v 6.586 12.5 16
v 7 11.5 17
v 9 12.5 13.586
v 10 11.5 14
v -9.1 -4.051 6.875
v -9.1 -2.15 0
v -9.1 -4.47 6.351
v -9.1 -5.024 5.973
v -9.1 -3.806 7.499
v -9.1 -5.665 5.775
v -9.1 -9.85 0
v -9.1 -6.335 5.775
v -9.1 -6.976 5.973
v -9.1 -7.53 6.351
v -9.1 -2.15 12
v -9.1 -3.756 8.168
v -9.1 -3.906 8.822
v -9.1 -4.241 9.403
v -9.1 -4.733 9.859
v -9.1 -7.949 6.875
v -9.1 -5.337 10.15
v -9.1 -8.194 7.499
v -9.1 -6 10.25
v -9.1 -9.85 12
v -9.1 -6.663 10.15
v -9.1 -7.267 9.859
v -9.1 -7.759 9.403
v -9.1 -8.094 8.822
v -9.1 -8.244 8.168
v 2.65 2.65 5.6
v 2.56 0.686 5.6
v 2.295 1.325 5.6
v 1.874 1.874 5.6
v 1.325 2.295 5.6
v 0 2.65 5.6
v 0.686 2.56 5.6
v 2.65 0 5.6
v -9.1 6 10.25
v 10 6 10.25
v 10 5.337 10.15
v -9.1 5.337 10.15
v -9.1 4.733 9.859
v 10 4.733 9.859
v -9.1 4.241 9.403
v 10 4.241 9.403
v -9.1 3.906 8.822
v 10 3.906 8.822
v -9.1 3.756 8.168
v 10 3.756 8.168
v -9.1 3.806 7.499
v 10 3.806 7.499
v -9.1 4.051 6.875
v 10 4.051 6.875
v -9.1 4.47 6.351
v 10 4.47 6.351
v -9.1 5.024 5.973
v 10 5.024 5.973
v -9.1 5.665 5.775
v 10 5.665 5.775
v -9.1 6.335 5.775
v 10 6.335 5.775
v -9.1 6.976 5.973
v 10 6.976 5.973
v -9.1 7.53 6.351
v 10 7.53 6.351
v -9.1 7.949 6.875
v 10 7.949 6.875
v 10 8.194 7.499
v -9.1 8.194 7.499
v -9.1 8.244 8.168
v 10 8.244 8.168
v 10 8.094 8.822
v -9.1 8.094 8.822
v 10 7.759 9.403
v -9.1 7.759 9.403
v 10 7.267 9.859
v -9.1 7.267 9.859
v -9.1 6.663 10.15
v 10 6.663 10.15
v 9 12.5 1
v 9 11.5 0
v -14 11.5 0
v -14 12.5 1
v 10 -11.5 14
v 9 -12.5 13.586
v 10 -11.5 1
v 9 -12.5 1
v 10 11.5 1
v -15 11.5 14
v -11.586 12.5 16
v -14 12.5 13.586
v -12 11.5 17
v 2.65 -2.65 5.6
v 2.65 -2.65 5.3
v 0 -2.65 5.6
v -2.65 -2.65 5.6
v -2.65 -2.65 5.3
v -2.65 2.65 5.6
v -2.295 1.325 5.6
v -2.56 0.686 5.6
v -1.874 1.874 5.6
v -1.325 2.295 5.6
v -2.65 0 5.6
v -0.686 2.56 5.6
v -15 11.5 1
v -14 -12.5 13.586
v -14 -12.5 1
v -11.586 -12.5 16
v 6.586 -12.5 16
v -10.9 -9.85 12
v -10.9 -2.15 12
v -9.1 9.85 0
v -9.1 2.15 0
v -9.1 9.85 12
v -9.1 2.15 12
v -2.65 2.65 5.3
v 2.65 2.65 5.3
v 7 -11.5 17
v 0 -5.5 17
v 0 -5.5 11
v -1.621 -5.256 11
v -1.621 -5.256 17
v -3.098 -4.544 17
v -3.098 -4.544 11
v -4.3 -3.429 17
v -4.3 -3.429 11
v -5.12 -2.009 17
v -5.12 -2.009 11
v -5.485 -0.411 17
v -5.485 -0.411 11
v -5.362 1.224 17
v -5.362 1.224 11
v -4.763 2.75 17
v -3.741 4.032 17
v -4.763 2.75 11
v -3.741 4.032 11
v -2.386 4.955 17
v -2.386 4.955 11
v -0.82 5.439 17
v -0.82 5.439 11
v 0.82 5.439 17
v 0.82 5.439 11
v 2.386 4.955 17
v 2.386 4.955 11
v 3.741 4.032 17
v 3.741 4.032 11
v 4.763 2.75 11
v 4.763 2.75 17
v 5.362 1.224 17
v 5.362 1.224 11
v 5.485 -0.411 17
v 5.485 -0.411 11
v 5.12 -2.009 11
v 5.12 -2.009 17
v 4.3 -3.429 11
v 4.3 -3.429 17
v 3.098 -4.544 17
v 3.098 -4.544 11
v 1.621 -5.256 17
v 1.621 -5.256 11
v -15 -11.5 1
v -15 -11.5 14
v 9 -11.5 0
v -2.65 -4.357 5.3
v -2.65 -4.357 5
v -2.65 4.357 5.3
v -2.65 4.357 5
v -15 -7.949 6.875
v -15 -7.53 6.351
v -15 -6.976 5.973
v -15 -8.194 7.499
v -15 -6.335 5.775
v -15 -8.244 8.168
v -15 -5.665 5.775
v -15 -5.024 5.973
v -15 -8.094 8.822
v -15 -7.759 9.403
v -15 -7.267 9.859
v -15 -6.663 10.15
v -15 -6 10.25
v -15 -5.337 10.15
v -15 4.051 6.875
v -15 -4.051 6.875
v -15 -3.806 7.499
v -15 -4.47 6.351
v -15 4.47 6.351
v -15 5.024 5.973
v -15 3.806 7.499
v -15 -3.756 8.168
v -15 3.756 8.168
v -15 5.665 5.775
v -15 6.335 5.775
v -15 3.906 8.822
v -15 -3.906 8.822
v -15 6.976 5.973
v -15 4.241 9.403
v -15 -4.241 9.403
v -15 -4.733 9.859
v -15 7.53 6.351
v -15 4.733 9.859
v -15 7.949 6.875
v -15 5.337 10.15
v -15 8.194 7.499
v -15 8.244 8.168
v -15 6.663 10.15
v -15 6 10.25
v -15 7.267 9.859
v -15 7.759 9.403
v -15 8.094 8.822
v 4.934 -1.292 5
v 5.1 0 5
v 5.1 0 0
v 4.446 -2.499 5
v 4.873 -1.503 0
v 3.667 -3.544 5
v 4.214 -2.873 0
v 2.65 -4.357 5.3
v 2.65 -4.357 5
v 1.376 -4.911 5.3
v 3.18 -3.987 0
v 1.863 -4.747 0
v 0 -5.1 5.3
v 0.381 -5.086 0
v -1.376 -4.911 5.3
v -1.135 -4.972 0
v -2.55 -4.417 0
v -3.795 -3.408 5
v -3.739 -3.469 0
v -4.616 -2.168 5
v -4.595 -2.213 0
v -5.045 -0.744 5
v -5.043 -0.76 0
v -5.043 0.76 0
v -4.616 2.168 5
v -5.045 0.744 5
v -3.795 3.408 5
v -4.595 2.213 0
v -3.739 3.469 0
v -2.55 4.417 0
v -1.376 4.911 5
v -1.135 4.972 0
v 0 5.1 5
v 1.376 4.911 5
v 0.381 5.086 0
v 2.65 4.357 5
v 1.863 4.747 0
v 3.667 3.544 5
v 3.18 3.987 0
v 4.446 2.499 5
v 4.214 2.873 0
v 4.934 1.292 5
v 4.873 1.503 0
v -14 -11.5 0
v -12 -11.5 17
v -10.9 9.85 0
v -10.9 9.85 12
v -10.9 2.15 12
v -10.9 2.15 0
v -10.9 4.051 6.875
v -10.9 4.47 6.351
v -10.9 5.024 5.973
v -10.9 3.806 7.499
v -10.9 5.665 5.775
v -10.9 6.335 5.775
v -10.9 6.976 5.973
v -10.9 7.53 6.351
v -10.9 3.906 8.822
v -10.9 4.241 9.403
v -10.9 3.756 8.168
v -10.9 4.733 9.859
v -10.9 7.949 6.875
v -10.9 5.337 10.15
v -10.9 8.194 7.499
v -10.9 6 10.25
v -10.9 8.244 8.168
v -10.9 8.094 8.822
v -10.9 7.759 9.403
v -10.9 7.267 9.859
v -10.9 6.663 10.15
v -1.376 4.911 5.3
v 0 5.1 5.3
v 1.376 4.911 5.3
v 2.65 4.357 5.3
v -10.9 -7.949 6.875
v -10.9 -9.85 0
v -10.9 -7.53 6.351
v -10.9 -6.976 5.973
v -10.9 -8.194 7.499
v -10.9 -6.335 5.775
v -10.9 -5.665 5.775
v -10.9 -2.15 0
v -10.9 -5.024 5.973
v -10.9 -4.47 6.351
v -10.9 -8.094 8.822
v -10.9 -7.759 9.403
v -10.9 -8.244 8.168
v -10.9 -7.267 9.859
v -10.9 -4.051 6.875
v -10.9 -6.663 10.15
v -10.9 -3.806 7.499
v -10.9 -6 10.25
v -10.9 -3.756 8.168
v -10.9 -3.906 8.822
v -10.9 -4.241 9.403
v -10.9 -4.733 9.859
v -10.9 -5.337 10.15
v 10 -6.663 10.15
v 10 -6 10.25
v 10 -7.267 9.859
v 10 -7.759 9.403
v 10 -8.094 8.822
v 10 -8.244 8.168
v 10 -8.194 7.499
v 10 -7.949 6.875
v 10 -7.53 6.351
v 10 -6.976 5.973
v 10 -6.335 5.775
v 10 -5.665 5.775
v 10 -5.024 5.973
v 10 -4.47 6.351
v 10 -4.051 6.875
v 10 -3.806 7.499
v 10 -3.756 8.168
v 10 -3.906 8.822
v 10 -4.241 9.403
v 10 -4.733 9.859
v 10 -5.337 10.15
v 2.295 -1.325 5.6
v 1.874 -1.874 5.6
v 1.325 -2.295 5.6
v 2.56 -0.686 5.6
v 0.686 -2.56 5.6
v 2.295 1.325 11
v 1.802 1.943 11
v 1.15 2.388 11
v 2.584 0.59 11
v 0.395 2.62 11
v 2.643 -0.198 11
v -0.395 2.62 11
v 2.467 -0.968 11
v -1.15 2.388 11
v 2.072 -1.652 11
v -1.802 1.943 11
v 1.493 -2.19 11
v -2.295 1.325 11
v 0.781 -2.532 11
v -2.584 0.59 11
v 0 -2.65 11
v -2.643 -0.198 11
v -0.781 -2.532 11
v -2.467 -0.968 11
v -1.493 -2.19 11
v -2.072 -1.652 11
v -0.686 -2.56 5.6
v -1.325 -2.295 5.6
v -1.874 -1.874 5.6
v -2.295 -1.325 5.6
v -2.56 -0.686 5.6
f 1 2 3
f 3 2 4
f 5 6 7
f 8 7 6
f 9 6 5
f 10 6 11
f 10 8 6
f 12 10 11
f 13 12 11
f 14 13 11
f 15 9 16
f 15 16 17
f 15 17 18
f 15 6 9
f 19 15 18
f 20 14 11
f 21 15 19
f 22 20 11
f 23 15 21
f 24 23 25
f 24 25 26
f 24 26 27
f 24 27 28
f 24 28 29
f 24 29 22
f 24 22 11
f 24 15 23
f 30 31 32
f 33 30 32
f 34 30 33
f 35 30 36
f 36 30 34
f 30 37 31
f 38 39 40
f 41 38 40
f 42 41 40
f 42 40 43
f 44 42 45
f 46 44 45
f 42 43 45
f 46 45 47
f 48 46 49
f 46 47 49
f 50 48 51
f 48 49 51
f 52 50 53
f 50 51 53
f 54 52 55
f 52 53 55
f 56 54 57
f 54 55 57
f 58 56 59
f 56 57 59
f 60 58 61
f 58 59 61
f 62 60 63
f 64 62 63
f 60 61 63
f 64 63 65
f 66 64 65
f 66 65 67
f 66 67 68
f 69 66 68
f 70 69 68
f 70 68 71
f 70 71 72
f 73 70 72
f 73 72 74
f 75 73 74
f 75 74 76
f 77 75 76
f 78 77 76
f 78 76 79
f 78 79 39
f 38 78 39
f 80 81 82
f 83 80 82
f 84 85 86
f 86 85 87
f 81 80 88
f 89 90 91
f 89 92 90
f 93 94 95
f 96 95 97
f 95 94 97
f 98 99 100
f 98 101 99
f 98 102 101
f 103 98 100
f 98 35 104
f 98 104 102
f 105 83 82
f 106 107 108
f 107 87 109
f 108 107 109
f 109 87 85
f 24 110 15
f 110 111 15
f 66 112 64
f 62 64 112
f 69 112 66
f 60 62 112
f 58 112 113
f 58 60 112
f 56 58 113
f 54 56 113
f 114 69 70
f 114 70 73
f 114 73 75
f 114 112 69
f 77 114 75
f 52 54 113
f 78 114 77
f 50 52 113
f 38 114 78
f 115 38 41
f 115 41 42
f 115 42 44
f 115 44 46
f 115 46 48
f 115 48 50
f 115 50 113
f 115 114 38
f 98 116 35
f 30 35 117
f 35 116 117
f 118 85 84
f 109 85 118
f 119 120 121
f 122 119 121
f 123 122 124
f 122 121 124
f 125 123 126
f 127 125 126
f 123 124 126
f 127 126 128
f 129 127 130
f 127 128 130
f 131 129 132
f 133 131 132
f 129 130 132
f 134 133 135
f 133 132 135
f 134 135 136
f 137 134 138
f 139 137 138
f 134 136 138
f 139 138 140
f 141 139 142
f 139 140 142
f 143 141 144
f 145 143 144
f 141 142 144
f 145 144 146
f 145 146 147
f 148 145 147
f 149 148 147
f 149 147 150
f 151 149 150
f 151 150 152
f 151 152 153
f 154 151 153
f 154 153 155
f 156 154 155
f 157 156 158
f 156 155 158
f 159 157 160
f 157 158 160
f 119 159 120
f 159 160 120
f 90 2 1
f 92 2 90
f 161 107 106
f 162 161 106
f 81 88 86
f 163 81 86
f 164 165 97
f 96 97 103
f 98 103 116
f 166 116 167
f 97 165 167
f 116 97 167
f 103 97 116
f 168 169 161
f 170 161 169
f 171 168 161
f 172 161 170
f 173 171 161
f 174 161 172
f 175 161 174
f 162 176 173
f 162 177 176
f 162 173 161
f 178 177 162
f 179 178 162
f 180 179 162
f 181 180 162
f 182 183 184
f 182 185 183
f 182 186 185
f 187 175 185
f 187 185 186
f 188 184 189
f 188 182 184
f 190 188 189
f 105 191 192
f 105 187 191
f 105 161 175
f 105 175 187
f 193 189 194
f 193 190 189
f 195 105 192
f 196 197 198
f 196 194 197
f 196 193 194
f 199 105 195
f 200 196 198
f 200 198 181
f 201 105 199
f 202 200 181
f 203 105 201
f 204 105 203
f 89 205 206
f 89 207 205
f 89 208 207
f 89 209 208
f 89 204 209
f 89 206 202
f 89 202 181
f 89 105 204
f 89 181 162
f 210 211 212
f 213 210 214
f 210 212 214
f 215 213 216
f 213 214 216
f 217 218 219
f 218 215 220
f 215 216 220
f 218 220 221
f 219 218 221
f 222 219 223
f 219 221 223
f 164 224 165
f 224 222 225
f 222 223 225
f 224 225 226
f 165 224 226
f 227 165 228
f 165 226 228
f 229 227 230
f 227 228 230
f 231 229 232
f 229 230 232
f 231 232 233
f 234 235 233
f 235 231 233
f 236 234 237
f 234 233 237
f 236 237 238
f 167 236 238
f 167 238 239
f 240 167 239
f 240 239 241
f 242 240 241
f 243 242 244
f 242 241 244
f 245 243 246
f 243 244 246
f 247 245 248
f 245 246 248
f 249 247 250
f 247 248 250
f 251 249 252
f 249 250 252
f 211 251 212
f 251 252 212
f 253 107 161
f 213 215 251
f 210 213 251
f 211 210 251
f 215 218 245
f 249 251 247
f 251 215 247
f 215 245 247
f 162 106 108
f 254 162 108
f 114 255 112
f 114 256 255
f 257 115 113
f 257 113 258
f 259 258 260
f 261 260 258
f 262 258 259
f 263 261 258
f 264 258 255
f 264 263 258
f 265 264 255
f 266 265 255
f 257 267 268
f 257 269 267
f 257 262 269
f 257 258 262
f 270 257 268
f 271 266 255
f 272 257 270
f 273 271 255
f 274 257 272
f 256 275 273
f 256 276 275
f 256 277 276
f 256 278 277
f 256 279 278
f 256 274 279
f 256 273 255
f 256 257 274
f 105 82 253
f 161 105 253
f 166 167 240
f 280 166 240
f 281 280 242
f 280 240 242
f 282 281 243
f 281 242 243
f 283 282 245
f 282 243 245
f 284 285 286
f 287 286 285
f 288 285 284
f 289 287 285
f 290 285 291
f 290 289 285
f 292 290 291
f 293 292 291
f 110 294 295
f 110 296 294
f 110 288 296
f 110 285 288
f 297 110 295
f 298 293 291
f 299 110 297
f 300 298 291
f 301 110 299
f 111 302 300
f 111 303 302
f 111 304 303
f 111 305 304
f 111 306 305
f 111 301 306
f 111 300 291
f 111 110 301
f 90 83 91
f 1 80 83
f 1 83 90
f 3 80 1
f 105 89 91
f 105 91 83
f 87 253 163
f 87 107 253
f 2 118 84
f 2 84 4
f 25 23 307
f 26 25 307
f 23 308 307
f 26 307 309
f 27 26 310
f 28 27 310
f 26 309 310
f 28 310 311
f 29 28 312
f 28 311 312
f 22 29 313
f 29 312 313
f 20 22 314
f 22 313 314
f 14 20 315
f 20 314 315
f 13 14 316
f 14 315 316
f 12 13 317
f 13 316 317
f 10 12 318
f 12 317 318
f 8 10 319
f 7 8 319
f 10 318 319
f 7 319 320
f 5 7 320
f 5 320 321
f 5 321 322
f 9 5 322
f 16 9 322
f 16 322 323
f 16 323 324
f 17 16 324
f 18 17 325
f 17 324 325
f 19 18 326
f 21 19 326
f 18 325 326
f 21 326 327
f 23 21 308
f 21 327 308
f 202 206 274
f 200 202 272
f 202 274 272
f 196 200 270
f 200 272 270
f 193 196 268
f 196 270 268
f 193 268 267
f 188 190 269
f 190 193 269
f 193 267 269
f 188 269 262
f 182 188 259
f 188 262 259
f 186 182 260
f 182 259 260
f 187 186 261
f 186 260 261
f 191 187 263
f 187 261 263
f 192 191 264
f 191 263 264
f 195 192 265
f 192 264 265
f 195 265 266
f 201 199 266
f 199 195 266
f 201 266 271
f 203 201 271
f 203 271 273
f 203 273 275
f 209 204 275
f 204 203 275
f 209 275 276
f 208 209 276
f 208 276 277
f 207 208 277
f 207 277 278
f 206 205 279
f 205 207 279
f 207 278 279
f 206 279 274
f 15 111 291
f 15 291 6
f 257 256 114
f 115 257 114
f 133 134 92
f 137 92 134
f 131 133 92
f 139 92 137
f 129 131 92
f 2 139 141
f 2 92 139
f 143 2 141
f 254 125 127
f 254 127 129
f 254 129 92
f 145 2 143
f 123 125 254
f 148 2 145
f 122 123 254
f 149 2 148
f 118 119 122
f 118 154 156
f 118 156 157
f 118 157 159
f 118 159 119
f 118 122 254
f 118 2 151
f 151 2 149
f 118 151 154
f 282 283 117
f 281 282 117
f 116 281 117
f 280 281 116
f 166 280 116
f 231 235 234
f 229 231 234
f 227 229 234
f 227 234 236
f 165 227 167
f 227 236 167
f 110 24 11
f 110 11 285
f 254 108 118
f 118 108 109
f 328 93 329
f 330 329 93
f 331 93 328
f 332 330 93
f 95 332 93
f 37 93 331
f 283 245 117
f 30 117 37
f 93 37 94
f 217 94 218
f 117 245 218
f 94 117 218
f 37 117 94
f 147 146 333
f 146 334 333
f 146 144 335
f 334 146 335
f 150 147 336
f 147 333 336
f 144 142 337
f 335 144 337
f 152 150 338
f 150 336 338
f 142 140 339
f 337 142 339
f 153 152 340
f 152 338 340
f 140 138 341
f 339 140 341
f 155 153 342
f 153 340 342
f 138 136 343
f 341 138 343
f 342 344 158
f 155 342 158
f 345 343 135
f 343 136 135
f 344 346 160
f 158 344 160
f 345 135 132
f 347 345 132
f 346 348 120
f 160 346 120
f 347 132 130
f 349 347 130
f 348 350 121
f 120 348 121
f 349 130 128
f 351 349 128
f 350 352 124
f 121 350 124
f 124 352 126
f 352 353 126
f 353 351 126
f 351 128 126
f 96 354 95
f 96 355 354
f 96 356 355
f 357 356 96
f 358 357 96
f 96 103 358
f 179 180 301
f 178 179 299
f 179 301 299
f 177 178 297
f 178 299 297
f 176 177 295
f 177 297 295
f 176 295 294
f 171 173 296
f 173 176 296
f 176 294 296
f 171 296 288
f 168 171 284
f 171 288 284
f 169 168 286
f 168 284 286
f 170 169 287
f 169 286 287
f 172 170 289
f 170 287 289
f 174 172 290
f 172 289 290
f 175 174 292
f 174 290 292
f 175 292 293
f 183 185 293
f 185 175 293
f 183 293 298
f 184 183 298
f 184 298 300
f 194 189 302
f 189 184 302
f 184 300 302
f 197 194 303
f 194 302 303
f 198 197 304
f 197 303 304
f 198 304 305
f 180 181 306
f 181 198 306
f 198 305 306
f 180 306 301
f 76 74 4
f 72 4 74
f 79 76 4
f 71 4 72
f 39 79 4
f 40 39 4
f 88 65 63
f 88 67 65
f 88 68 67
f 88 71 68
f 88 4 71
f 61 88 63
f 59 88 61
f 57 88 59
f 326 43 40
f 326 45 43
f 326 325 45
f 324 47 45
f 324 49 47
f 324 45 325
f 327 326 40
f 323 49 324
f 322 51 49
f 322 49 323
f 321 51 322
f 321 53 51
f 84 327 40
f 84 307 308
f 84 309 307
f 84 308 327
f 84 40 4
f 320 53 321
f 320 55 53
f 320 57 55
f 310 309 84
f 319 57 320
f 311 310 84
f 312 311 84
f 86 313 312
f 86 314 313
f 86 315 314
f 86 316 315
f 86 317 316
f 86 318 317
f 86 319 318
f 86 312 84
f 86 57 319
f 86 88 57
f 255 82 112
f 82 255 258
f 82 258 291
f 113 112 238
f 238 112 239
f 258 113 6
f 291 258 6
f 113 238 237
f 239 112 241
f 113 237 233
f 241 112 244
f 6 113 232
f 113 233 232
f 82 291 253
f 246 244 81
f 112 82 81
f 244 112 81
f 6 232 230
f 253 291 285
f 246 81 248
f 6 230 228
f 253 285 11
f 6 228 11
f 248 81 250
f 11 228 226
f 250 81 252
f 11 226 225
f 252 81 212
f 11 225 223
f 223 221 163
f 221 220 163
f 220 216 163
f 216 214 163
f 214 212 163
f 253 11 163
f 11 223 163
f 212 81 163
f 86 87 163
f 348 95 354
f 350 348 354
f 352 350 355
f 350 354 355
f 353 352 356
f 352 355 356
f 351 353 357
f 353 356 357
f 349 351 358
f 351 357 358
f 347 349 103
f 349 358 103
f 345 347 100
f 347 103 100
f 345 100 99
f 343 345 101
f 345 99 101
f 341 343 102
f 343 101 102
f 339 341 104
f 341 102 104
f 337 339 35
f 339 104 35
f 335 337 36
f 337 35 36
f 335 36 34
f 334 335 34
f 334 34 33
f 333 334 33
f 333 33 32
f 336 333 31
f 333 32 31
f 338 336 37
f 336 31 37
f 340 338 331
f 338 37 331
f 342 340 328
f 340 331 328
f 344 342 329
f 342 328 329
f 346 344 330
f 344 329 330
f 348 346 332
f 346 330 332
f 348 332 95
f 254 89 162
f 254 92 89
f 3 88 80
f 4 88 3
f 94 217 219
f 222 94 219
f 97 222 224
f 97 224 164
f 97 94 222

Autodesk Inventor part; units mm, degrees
ref_plane "YZ Plane" through (0, 0, 0) normal (1, 0, 0) x (0, 1, 0)
ref_plane "XZ Plane" through (0, 0, 0) normal (0, 1, 0) x (-1, 0, 0)
ref_plane "XY Plane" through (0, 0, 0) normal (0, 0, 1) x (1, 0, 0)
sketch "スケッチ1" plane through (0, 0, 0) normal (0, 0, 1) x (1, 0, 0)
  circle A0 centre (0, 0) radius 5.1
  line L0 (10, -12.5) -> (-10, -12.5)
  line L1 (-10, -12.5) -> (-10, 12.5)
  line L2 (-10, 12.5) -> (10, 12.5)
  line L3 (10, 12.5) -> (10, -12.5)
  line L4 (10, -12.5) -> (-10, 12.5) construction
  line L5 (-10, -12.5) -> (10, 12.5) construction
  dimension "d0" = 10.2
  dimension "d1" = 25
  dimension "d2" = 20
extrude "押し出し1" add sketch "スケッチ1" along normal blind 17
sketch "スケッチ2" plane through (0, 0, 17) normal (0, 0, 1) x (1, 0, 0)
  circle A0 centre (0, 0) radius 5.1 projected
extrude "押し出し2" add sketch "スケッチ2" against normal blind 12
sketch "スケッチ3" plane through (0, 0, 17) normal (0, 0, 1) x (1, 0, 0)
  point P0 (0, 0)
hole "穴1" at (0, 0, 17) direction (0, 0, -1) diameter 5.3 depth 58 counterbore diameter 11 counterbore depth 6
sketch "Sketch7" plane through (-10, -12.5, 0) normal (-1, 0, 0) x (0, 0, 1)
  line L0 (0, 25) -> (0, 0) projected
  line L1 (5, 7.4) -> (5, 17.6) projected
  line L2 (0, 17.6) -> (0, 7.4) projected
  point P0 (0, 12.5)
  point P1 (8, 6.5)
  point P2 (8, 18.5)
  dimension "d35" = 8
  dimension "d36" = 12
  dimension "d37" = 6
hole "Hole3" at (-10, -6, 8) at (-10, 6, 8) direction (1, 0, 0) diameter 4.5 depth 58
chamfer "Chamfer2" distance 3 angle 45 1 edges at (10, 0, 17)
sketch "Sketch8" plane through (-10, -12.5, 0) normal (-1, 0, 0) x (0, 0, 1)
  circle A0 centre (8, 6.5) radius 2.25 projected
  circle A1 centre (8, 18.5) radius 2.25 projected
  line L0 (0, 25) -> (0, 0) projected
  line L1 (0, 0) -> (17, 0) projected
  line L2 (17, 25) -> (17, 0) projected
  line L3 (0, 25) -> (17, 25) projected
  point P0 (0, 12.5)
extrude "Extrusion5" add sketch "Sketch8" along normal blind 5
sketch "Sketch9" plane through (0, 0, 17) normal (0, 0, 1) x (1, 0, 0)
  line L0 (7, 12.5) -> (7, -12.5) projected
  line L1 (7, 12.5) -> (-15, 12.5) projected
  line L2 (-15, -12.5) -> (-15, 12.5) projected
  line L3 (7, -12.5) -> (-15, -12.5) projected
  circle A0 centre (0, 0) radius 5.5 projected
  line L4 (-15, 3.75) -> (-15, 8.25) projected
  line L5 (10, 8.25) -> (10, 3.75) projected
  line L6 (-15, -8.25) -> (-15, -3.75) projected
  line L7 (-15, -8.25) -> (-15, -3.75) projected
  line L8 (10, -3.75) -> (10, -8.25) projected
  line L9 (-10.9, 9.85) -> (-9.1, 9.85)
  line L10 (-9.1, 9.85) -> (-9.1, 2.15)
  line L11 (-9.1, 2.15) -> (-10.9, 2.15)
  line L12 (-10.9, 2.15) -> (-10.9, 9.85)
  line L13 (-10.9, 9.85) -> (-9.1, 2.15) construction
  line L14 (-9.1, 9.85) -> (-10.9, 2.15) construction
  line L15 (-10.9, -2.15) -> (-9.1, -2.15)
  line L16 (-9.1, -2.15) -> (-9.1, -9.85)
  line L17 (-9.1, -9.85) -> (-10.9, -9.85)
  line L18 (-10.9, -9.85) -> (-10.9, -2.15)
  line L19 (-10.9, -2.15) -> (-9.1, -9.85) construction
  line L20 (-9.1, -2.15) -> (-10.9, -9.85) construction
  line L21 (10, 8.25) -> (10, 3.75) projected
  point P0 (-10, 6)
  point P1 (-10, -6)
  point P2 (-10, 6)
  point P3 (-10, -6)
  point P4 (10, 6)
  point P5 (10, -6)
  point P6 (10, 6)
  dimension "d53" = 7.7
  dimension "d54" = 7.7
  dimension "d55" = 1.8
  dimension "d56" = 5
extrude "Extrusion6" cut sketch "Sketch9" against normal through all contours L9 L10 L11 L12 | L15 L16 L17 L18
sketch "Sketch10" plane through (0, 0, 17) normal (0, 0, 1) x (1, 0, 0)
  line L0 (-9.1, -2.15) -> (-9.1, -9.85) projected
  line L1 (-9.1, -9.85) -> (-10.9, -9.85) projected
  line L2 (-10.9, -9.85) -> (-10.9, -2.15) projected
  line L3 (-10.9, -2.15) -> (-9.1, -2.15) projected
  line L4 (-10.9, 9.85) -> (-9.1, 9.85) projected
  line L5 (-9.1, 9.85) -> (-9.1, 2.15) projected
  line L6 (-9.1, 2.15) -> (-10.9, 2.15) projected
  line L7 (-10.9, 2.15) -> (-10.9, 9.85) projected
  line L8 (7, 12.5) -> (7, -12.5) projected
  line L9 (7, 12.5) -> (-15, 12.5) projected
  line L10 (-15, -12.5) -> (-15, 12.5) projected
  line L11 (7, -12.5) -> (-15, -12.5) projected
  circle A0 centre (0, 0) radius 5.5 projected
extrude "Extrusion7" add sketch "Sketch10" against normal blind 5 contours L0 L1 L2 L3 | L4 L5 L6 L7
chamfer "Chamfer4" distance 3 angle 45 1 edges at (-15, 0, 17)
chamfer "面取り7" distance 1 angle 45 14 edges at (-15, 12.5, 7) (-13.5, 12.5, 15.5) (-2.5, 12.5, 17) (8.5, 12.5, 15.5) (10, 12.5, 7) (10, -12.5, 7) (8.5, -12.5, 15.5) (-2.5, -12.5, 17) (-13.5, -12.5, 15.5) (-15, -12.5, 7) (-2.5, 12.5, 0) (-2.5, -12.5, 0) (10, 0, 0) (-15, 0, 0)
sketch "スケッチ11" plane through (0, 0, 5) normal (0, 0, -1) x (-1, 0, 0)
  circle A0 centre (0, 0) radius 2.65 projected
  line L0 (2.65, 2.65) -> (-2.65, 2.65)
  line L1 (-2.65, 2.65) -> (-2.65, -2.65)
  line L2 (-2.65, -2.65) -> (2.65, -2.65)
  line L3 (2.65, -2.65) -> (2.65, 2.65)
  circle A1 centre (0, 0) radius 2.65 projected
  line L4 (2.65, 2.65) -> (-2.65, -2.65) construction
  line L5 (-2.65, 2.65) -> (2.65, -2.65) construction
  point P0 (2.65, 0)
  point P1 (0, -2.65)
  point P2 (0, 2.65)
  point P3 (-2.65, 0)
extrude "押し出し8" cut sketch "スケッチ11" against normal blind 0.6 contours L3 L2 A0 | A0 L0 L3 | A0 L1 L0 | L2 L1 A0
sketch "スケッチ12" plane through (0, 0, 5) normal (0, 0, -1) x (-1, 0, 0)
  line L0 (-2.65, 2.65) -> (2.65, 2.65) projected
  line L1 (2.65, -2.65) -> (-2.65, -2.65) projected
  circle A0 centre (0, 0) radius 5.1 projected
  line L2 (2.65, 5.3923) -> (-2.65, 5.3923)
  line L3 (-2.65, 5.3923) -> (-2.65, -5.3923)
  line L4 (-2.65, -5.3923) -> (2.65, -5.3923)
  line L5 (2.65, -5.3923) -> (2.65, 5.3923)
  line L6 (2.65, 5.3923) -> (-2.65, -5.3923) construction
  line L7 (-2.65, 5.3923) -> (2.65, -5.3923) construction
  point P0 (2.65, 2.65)
  point P1 (2.65, 4.3575)
  point P2 (-2.65, 4.3575)
  point P3 (2.65, -4.3575)
  point P4 (-2.65, -4.3575)
extrude "押し出し9" cut sketch "スケッチ12" against normal blind 0.3 contours L3 A0 L5 L0 | L1 L5 A0 L3
equation "\"d37\" = 0.5 * d36"
properties part number "Print_Parts_R" material "PC/ABS プラスチック"
